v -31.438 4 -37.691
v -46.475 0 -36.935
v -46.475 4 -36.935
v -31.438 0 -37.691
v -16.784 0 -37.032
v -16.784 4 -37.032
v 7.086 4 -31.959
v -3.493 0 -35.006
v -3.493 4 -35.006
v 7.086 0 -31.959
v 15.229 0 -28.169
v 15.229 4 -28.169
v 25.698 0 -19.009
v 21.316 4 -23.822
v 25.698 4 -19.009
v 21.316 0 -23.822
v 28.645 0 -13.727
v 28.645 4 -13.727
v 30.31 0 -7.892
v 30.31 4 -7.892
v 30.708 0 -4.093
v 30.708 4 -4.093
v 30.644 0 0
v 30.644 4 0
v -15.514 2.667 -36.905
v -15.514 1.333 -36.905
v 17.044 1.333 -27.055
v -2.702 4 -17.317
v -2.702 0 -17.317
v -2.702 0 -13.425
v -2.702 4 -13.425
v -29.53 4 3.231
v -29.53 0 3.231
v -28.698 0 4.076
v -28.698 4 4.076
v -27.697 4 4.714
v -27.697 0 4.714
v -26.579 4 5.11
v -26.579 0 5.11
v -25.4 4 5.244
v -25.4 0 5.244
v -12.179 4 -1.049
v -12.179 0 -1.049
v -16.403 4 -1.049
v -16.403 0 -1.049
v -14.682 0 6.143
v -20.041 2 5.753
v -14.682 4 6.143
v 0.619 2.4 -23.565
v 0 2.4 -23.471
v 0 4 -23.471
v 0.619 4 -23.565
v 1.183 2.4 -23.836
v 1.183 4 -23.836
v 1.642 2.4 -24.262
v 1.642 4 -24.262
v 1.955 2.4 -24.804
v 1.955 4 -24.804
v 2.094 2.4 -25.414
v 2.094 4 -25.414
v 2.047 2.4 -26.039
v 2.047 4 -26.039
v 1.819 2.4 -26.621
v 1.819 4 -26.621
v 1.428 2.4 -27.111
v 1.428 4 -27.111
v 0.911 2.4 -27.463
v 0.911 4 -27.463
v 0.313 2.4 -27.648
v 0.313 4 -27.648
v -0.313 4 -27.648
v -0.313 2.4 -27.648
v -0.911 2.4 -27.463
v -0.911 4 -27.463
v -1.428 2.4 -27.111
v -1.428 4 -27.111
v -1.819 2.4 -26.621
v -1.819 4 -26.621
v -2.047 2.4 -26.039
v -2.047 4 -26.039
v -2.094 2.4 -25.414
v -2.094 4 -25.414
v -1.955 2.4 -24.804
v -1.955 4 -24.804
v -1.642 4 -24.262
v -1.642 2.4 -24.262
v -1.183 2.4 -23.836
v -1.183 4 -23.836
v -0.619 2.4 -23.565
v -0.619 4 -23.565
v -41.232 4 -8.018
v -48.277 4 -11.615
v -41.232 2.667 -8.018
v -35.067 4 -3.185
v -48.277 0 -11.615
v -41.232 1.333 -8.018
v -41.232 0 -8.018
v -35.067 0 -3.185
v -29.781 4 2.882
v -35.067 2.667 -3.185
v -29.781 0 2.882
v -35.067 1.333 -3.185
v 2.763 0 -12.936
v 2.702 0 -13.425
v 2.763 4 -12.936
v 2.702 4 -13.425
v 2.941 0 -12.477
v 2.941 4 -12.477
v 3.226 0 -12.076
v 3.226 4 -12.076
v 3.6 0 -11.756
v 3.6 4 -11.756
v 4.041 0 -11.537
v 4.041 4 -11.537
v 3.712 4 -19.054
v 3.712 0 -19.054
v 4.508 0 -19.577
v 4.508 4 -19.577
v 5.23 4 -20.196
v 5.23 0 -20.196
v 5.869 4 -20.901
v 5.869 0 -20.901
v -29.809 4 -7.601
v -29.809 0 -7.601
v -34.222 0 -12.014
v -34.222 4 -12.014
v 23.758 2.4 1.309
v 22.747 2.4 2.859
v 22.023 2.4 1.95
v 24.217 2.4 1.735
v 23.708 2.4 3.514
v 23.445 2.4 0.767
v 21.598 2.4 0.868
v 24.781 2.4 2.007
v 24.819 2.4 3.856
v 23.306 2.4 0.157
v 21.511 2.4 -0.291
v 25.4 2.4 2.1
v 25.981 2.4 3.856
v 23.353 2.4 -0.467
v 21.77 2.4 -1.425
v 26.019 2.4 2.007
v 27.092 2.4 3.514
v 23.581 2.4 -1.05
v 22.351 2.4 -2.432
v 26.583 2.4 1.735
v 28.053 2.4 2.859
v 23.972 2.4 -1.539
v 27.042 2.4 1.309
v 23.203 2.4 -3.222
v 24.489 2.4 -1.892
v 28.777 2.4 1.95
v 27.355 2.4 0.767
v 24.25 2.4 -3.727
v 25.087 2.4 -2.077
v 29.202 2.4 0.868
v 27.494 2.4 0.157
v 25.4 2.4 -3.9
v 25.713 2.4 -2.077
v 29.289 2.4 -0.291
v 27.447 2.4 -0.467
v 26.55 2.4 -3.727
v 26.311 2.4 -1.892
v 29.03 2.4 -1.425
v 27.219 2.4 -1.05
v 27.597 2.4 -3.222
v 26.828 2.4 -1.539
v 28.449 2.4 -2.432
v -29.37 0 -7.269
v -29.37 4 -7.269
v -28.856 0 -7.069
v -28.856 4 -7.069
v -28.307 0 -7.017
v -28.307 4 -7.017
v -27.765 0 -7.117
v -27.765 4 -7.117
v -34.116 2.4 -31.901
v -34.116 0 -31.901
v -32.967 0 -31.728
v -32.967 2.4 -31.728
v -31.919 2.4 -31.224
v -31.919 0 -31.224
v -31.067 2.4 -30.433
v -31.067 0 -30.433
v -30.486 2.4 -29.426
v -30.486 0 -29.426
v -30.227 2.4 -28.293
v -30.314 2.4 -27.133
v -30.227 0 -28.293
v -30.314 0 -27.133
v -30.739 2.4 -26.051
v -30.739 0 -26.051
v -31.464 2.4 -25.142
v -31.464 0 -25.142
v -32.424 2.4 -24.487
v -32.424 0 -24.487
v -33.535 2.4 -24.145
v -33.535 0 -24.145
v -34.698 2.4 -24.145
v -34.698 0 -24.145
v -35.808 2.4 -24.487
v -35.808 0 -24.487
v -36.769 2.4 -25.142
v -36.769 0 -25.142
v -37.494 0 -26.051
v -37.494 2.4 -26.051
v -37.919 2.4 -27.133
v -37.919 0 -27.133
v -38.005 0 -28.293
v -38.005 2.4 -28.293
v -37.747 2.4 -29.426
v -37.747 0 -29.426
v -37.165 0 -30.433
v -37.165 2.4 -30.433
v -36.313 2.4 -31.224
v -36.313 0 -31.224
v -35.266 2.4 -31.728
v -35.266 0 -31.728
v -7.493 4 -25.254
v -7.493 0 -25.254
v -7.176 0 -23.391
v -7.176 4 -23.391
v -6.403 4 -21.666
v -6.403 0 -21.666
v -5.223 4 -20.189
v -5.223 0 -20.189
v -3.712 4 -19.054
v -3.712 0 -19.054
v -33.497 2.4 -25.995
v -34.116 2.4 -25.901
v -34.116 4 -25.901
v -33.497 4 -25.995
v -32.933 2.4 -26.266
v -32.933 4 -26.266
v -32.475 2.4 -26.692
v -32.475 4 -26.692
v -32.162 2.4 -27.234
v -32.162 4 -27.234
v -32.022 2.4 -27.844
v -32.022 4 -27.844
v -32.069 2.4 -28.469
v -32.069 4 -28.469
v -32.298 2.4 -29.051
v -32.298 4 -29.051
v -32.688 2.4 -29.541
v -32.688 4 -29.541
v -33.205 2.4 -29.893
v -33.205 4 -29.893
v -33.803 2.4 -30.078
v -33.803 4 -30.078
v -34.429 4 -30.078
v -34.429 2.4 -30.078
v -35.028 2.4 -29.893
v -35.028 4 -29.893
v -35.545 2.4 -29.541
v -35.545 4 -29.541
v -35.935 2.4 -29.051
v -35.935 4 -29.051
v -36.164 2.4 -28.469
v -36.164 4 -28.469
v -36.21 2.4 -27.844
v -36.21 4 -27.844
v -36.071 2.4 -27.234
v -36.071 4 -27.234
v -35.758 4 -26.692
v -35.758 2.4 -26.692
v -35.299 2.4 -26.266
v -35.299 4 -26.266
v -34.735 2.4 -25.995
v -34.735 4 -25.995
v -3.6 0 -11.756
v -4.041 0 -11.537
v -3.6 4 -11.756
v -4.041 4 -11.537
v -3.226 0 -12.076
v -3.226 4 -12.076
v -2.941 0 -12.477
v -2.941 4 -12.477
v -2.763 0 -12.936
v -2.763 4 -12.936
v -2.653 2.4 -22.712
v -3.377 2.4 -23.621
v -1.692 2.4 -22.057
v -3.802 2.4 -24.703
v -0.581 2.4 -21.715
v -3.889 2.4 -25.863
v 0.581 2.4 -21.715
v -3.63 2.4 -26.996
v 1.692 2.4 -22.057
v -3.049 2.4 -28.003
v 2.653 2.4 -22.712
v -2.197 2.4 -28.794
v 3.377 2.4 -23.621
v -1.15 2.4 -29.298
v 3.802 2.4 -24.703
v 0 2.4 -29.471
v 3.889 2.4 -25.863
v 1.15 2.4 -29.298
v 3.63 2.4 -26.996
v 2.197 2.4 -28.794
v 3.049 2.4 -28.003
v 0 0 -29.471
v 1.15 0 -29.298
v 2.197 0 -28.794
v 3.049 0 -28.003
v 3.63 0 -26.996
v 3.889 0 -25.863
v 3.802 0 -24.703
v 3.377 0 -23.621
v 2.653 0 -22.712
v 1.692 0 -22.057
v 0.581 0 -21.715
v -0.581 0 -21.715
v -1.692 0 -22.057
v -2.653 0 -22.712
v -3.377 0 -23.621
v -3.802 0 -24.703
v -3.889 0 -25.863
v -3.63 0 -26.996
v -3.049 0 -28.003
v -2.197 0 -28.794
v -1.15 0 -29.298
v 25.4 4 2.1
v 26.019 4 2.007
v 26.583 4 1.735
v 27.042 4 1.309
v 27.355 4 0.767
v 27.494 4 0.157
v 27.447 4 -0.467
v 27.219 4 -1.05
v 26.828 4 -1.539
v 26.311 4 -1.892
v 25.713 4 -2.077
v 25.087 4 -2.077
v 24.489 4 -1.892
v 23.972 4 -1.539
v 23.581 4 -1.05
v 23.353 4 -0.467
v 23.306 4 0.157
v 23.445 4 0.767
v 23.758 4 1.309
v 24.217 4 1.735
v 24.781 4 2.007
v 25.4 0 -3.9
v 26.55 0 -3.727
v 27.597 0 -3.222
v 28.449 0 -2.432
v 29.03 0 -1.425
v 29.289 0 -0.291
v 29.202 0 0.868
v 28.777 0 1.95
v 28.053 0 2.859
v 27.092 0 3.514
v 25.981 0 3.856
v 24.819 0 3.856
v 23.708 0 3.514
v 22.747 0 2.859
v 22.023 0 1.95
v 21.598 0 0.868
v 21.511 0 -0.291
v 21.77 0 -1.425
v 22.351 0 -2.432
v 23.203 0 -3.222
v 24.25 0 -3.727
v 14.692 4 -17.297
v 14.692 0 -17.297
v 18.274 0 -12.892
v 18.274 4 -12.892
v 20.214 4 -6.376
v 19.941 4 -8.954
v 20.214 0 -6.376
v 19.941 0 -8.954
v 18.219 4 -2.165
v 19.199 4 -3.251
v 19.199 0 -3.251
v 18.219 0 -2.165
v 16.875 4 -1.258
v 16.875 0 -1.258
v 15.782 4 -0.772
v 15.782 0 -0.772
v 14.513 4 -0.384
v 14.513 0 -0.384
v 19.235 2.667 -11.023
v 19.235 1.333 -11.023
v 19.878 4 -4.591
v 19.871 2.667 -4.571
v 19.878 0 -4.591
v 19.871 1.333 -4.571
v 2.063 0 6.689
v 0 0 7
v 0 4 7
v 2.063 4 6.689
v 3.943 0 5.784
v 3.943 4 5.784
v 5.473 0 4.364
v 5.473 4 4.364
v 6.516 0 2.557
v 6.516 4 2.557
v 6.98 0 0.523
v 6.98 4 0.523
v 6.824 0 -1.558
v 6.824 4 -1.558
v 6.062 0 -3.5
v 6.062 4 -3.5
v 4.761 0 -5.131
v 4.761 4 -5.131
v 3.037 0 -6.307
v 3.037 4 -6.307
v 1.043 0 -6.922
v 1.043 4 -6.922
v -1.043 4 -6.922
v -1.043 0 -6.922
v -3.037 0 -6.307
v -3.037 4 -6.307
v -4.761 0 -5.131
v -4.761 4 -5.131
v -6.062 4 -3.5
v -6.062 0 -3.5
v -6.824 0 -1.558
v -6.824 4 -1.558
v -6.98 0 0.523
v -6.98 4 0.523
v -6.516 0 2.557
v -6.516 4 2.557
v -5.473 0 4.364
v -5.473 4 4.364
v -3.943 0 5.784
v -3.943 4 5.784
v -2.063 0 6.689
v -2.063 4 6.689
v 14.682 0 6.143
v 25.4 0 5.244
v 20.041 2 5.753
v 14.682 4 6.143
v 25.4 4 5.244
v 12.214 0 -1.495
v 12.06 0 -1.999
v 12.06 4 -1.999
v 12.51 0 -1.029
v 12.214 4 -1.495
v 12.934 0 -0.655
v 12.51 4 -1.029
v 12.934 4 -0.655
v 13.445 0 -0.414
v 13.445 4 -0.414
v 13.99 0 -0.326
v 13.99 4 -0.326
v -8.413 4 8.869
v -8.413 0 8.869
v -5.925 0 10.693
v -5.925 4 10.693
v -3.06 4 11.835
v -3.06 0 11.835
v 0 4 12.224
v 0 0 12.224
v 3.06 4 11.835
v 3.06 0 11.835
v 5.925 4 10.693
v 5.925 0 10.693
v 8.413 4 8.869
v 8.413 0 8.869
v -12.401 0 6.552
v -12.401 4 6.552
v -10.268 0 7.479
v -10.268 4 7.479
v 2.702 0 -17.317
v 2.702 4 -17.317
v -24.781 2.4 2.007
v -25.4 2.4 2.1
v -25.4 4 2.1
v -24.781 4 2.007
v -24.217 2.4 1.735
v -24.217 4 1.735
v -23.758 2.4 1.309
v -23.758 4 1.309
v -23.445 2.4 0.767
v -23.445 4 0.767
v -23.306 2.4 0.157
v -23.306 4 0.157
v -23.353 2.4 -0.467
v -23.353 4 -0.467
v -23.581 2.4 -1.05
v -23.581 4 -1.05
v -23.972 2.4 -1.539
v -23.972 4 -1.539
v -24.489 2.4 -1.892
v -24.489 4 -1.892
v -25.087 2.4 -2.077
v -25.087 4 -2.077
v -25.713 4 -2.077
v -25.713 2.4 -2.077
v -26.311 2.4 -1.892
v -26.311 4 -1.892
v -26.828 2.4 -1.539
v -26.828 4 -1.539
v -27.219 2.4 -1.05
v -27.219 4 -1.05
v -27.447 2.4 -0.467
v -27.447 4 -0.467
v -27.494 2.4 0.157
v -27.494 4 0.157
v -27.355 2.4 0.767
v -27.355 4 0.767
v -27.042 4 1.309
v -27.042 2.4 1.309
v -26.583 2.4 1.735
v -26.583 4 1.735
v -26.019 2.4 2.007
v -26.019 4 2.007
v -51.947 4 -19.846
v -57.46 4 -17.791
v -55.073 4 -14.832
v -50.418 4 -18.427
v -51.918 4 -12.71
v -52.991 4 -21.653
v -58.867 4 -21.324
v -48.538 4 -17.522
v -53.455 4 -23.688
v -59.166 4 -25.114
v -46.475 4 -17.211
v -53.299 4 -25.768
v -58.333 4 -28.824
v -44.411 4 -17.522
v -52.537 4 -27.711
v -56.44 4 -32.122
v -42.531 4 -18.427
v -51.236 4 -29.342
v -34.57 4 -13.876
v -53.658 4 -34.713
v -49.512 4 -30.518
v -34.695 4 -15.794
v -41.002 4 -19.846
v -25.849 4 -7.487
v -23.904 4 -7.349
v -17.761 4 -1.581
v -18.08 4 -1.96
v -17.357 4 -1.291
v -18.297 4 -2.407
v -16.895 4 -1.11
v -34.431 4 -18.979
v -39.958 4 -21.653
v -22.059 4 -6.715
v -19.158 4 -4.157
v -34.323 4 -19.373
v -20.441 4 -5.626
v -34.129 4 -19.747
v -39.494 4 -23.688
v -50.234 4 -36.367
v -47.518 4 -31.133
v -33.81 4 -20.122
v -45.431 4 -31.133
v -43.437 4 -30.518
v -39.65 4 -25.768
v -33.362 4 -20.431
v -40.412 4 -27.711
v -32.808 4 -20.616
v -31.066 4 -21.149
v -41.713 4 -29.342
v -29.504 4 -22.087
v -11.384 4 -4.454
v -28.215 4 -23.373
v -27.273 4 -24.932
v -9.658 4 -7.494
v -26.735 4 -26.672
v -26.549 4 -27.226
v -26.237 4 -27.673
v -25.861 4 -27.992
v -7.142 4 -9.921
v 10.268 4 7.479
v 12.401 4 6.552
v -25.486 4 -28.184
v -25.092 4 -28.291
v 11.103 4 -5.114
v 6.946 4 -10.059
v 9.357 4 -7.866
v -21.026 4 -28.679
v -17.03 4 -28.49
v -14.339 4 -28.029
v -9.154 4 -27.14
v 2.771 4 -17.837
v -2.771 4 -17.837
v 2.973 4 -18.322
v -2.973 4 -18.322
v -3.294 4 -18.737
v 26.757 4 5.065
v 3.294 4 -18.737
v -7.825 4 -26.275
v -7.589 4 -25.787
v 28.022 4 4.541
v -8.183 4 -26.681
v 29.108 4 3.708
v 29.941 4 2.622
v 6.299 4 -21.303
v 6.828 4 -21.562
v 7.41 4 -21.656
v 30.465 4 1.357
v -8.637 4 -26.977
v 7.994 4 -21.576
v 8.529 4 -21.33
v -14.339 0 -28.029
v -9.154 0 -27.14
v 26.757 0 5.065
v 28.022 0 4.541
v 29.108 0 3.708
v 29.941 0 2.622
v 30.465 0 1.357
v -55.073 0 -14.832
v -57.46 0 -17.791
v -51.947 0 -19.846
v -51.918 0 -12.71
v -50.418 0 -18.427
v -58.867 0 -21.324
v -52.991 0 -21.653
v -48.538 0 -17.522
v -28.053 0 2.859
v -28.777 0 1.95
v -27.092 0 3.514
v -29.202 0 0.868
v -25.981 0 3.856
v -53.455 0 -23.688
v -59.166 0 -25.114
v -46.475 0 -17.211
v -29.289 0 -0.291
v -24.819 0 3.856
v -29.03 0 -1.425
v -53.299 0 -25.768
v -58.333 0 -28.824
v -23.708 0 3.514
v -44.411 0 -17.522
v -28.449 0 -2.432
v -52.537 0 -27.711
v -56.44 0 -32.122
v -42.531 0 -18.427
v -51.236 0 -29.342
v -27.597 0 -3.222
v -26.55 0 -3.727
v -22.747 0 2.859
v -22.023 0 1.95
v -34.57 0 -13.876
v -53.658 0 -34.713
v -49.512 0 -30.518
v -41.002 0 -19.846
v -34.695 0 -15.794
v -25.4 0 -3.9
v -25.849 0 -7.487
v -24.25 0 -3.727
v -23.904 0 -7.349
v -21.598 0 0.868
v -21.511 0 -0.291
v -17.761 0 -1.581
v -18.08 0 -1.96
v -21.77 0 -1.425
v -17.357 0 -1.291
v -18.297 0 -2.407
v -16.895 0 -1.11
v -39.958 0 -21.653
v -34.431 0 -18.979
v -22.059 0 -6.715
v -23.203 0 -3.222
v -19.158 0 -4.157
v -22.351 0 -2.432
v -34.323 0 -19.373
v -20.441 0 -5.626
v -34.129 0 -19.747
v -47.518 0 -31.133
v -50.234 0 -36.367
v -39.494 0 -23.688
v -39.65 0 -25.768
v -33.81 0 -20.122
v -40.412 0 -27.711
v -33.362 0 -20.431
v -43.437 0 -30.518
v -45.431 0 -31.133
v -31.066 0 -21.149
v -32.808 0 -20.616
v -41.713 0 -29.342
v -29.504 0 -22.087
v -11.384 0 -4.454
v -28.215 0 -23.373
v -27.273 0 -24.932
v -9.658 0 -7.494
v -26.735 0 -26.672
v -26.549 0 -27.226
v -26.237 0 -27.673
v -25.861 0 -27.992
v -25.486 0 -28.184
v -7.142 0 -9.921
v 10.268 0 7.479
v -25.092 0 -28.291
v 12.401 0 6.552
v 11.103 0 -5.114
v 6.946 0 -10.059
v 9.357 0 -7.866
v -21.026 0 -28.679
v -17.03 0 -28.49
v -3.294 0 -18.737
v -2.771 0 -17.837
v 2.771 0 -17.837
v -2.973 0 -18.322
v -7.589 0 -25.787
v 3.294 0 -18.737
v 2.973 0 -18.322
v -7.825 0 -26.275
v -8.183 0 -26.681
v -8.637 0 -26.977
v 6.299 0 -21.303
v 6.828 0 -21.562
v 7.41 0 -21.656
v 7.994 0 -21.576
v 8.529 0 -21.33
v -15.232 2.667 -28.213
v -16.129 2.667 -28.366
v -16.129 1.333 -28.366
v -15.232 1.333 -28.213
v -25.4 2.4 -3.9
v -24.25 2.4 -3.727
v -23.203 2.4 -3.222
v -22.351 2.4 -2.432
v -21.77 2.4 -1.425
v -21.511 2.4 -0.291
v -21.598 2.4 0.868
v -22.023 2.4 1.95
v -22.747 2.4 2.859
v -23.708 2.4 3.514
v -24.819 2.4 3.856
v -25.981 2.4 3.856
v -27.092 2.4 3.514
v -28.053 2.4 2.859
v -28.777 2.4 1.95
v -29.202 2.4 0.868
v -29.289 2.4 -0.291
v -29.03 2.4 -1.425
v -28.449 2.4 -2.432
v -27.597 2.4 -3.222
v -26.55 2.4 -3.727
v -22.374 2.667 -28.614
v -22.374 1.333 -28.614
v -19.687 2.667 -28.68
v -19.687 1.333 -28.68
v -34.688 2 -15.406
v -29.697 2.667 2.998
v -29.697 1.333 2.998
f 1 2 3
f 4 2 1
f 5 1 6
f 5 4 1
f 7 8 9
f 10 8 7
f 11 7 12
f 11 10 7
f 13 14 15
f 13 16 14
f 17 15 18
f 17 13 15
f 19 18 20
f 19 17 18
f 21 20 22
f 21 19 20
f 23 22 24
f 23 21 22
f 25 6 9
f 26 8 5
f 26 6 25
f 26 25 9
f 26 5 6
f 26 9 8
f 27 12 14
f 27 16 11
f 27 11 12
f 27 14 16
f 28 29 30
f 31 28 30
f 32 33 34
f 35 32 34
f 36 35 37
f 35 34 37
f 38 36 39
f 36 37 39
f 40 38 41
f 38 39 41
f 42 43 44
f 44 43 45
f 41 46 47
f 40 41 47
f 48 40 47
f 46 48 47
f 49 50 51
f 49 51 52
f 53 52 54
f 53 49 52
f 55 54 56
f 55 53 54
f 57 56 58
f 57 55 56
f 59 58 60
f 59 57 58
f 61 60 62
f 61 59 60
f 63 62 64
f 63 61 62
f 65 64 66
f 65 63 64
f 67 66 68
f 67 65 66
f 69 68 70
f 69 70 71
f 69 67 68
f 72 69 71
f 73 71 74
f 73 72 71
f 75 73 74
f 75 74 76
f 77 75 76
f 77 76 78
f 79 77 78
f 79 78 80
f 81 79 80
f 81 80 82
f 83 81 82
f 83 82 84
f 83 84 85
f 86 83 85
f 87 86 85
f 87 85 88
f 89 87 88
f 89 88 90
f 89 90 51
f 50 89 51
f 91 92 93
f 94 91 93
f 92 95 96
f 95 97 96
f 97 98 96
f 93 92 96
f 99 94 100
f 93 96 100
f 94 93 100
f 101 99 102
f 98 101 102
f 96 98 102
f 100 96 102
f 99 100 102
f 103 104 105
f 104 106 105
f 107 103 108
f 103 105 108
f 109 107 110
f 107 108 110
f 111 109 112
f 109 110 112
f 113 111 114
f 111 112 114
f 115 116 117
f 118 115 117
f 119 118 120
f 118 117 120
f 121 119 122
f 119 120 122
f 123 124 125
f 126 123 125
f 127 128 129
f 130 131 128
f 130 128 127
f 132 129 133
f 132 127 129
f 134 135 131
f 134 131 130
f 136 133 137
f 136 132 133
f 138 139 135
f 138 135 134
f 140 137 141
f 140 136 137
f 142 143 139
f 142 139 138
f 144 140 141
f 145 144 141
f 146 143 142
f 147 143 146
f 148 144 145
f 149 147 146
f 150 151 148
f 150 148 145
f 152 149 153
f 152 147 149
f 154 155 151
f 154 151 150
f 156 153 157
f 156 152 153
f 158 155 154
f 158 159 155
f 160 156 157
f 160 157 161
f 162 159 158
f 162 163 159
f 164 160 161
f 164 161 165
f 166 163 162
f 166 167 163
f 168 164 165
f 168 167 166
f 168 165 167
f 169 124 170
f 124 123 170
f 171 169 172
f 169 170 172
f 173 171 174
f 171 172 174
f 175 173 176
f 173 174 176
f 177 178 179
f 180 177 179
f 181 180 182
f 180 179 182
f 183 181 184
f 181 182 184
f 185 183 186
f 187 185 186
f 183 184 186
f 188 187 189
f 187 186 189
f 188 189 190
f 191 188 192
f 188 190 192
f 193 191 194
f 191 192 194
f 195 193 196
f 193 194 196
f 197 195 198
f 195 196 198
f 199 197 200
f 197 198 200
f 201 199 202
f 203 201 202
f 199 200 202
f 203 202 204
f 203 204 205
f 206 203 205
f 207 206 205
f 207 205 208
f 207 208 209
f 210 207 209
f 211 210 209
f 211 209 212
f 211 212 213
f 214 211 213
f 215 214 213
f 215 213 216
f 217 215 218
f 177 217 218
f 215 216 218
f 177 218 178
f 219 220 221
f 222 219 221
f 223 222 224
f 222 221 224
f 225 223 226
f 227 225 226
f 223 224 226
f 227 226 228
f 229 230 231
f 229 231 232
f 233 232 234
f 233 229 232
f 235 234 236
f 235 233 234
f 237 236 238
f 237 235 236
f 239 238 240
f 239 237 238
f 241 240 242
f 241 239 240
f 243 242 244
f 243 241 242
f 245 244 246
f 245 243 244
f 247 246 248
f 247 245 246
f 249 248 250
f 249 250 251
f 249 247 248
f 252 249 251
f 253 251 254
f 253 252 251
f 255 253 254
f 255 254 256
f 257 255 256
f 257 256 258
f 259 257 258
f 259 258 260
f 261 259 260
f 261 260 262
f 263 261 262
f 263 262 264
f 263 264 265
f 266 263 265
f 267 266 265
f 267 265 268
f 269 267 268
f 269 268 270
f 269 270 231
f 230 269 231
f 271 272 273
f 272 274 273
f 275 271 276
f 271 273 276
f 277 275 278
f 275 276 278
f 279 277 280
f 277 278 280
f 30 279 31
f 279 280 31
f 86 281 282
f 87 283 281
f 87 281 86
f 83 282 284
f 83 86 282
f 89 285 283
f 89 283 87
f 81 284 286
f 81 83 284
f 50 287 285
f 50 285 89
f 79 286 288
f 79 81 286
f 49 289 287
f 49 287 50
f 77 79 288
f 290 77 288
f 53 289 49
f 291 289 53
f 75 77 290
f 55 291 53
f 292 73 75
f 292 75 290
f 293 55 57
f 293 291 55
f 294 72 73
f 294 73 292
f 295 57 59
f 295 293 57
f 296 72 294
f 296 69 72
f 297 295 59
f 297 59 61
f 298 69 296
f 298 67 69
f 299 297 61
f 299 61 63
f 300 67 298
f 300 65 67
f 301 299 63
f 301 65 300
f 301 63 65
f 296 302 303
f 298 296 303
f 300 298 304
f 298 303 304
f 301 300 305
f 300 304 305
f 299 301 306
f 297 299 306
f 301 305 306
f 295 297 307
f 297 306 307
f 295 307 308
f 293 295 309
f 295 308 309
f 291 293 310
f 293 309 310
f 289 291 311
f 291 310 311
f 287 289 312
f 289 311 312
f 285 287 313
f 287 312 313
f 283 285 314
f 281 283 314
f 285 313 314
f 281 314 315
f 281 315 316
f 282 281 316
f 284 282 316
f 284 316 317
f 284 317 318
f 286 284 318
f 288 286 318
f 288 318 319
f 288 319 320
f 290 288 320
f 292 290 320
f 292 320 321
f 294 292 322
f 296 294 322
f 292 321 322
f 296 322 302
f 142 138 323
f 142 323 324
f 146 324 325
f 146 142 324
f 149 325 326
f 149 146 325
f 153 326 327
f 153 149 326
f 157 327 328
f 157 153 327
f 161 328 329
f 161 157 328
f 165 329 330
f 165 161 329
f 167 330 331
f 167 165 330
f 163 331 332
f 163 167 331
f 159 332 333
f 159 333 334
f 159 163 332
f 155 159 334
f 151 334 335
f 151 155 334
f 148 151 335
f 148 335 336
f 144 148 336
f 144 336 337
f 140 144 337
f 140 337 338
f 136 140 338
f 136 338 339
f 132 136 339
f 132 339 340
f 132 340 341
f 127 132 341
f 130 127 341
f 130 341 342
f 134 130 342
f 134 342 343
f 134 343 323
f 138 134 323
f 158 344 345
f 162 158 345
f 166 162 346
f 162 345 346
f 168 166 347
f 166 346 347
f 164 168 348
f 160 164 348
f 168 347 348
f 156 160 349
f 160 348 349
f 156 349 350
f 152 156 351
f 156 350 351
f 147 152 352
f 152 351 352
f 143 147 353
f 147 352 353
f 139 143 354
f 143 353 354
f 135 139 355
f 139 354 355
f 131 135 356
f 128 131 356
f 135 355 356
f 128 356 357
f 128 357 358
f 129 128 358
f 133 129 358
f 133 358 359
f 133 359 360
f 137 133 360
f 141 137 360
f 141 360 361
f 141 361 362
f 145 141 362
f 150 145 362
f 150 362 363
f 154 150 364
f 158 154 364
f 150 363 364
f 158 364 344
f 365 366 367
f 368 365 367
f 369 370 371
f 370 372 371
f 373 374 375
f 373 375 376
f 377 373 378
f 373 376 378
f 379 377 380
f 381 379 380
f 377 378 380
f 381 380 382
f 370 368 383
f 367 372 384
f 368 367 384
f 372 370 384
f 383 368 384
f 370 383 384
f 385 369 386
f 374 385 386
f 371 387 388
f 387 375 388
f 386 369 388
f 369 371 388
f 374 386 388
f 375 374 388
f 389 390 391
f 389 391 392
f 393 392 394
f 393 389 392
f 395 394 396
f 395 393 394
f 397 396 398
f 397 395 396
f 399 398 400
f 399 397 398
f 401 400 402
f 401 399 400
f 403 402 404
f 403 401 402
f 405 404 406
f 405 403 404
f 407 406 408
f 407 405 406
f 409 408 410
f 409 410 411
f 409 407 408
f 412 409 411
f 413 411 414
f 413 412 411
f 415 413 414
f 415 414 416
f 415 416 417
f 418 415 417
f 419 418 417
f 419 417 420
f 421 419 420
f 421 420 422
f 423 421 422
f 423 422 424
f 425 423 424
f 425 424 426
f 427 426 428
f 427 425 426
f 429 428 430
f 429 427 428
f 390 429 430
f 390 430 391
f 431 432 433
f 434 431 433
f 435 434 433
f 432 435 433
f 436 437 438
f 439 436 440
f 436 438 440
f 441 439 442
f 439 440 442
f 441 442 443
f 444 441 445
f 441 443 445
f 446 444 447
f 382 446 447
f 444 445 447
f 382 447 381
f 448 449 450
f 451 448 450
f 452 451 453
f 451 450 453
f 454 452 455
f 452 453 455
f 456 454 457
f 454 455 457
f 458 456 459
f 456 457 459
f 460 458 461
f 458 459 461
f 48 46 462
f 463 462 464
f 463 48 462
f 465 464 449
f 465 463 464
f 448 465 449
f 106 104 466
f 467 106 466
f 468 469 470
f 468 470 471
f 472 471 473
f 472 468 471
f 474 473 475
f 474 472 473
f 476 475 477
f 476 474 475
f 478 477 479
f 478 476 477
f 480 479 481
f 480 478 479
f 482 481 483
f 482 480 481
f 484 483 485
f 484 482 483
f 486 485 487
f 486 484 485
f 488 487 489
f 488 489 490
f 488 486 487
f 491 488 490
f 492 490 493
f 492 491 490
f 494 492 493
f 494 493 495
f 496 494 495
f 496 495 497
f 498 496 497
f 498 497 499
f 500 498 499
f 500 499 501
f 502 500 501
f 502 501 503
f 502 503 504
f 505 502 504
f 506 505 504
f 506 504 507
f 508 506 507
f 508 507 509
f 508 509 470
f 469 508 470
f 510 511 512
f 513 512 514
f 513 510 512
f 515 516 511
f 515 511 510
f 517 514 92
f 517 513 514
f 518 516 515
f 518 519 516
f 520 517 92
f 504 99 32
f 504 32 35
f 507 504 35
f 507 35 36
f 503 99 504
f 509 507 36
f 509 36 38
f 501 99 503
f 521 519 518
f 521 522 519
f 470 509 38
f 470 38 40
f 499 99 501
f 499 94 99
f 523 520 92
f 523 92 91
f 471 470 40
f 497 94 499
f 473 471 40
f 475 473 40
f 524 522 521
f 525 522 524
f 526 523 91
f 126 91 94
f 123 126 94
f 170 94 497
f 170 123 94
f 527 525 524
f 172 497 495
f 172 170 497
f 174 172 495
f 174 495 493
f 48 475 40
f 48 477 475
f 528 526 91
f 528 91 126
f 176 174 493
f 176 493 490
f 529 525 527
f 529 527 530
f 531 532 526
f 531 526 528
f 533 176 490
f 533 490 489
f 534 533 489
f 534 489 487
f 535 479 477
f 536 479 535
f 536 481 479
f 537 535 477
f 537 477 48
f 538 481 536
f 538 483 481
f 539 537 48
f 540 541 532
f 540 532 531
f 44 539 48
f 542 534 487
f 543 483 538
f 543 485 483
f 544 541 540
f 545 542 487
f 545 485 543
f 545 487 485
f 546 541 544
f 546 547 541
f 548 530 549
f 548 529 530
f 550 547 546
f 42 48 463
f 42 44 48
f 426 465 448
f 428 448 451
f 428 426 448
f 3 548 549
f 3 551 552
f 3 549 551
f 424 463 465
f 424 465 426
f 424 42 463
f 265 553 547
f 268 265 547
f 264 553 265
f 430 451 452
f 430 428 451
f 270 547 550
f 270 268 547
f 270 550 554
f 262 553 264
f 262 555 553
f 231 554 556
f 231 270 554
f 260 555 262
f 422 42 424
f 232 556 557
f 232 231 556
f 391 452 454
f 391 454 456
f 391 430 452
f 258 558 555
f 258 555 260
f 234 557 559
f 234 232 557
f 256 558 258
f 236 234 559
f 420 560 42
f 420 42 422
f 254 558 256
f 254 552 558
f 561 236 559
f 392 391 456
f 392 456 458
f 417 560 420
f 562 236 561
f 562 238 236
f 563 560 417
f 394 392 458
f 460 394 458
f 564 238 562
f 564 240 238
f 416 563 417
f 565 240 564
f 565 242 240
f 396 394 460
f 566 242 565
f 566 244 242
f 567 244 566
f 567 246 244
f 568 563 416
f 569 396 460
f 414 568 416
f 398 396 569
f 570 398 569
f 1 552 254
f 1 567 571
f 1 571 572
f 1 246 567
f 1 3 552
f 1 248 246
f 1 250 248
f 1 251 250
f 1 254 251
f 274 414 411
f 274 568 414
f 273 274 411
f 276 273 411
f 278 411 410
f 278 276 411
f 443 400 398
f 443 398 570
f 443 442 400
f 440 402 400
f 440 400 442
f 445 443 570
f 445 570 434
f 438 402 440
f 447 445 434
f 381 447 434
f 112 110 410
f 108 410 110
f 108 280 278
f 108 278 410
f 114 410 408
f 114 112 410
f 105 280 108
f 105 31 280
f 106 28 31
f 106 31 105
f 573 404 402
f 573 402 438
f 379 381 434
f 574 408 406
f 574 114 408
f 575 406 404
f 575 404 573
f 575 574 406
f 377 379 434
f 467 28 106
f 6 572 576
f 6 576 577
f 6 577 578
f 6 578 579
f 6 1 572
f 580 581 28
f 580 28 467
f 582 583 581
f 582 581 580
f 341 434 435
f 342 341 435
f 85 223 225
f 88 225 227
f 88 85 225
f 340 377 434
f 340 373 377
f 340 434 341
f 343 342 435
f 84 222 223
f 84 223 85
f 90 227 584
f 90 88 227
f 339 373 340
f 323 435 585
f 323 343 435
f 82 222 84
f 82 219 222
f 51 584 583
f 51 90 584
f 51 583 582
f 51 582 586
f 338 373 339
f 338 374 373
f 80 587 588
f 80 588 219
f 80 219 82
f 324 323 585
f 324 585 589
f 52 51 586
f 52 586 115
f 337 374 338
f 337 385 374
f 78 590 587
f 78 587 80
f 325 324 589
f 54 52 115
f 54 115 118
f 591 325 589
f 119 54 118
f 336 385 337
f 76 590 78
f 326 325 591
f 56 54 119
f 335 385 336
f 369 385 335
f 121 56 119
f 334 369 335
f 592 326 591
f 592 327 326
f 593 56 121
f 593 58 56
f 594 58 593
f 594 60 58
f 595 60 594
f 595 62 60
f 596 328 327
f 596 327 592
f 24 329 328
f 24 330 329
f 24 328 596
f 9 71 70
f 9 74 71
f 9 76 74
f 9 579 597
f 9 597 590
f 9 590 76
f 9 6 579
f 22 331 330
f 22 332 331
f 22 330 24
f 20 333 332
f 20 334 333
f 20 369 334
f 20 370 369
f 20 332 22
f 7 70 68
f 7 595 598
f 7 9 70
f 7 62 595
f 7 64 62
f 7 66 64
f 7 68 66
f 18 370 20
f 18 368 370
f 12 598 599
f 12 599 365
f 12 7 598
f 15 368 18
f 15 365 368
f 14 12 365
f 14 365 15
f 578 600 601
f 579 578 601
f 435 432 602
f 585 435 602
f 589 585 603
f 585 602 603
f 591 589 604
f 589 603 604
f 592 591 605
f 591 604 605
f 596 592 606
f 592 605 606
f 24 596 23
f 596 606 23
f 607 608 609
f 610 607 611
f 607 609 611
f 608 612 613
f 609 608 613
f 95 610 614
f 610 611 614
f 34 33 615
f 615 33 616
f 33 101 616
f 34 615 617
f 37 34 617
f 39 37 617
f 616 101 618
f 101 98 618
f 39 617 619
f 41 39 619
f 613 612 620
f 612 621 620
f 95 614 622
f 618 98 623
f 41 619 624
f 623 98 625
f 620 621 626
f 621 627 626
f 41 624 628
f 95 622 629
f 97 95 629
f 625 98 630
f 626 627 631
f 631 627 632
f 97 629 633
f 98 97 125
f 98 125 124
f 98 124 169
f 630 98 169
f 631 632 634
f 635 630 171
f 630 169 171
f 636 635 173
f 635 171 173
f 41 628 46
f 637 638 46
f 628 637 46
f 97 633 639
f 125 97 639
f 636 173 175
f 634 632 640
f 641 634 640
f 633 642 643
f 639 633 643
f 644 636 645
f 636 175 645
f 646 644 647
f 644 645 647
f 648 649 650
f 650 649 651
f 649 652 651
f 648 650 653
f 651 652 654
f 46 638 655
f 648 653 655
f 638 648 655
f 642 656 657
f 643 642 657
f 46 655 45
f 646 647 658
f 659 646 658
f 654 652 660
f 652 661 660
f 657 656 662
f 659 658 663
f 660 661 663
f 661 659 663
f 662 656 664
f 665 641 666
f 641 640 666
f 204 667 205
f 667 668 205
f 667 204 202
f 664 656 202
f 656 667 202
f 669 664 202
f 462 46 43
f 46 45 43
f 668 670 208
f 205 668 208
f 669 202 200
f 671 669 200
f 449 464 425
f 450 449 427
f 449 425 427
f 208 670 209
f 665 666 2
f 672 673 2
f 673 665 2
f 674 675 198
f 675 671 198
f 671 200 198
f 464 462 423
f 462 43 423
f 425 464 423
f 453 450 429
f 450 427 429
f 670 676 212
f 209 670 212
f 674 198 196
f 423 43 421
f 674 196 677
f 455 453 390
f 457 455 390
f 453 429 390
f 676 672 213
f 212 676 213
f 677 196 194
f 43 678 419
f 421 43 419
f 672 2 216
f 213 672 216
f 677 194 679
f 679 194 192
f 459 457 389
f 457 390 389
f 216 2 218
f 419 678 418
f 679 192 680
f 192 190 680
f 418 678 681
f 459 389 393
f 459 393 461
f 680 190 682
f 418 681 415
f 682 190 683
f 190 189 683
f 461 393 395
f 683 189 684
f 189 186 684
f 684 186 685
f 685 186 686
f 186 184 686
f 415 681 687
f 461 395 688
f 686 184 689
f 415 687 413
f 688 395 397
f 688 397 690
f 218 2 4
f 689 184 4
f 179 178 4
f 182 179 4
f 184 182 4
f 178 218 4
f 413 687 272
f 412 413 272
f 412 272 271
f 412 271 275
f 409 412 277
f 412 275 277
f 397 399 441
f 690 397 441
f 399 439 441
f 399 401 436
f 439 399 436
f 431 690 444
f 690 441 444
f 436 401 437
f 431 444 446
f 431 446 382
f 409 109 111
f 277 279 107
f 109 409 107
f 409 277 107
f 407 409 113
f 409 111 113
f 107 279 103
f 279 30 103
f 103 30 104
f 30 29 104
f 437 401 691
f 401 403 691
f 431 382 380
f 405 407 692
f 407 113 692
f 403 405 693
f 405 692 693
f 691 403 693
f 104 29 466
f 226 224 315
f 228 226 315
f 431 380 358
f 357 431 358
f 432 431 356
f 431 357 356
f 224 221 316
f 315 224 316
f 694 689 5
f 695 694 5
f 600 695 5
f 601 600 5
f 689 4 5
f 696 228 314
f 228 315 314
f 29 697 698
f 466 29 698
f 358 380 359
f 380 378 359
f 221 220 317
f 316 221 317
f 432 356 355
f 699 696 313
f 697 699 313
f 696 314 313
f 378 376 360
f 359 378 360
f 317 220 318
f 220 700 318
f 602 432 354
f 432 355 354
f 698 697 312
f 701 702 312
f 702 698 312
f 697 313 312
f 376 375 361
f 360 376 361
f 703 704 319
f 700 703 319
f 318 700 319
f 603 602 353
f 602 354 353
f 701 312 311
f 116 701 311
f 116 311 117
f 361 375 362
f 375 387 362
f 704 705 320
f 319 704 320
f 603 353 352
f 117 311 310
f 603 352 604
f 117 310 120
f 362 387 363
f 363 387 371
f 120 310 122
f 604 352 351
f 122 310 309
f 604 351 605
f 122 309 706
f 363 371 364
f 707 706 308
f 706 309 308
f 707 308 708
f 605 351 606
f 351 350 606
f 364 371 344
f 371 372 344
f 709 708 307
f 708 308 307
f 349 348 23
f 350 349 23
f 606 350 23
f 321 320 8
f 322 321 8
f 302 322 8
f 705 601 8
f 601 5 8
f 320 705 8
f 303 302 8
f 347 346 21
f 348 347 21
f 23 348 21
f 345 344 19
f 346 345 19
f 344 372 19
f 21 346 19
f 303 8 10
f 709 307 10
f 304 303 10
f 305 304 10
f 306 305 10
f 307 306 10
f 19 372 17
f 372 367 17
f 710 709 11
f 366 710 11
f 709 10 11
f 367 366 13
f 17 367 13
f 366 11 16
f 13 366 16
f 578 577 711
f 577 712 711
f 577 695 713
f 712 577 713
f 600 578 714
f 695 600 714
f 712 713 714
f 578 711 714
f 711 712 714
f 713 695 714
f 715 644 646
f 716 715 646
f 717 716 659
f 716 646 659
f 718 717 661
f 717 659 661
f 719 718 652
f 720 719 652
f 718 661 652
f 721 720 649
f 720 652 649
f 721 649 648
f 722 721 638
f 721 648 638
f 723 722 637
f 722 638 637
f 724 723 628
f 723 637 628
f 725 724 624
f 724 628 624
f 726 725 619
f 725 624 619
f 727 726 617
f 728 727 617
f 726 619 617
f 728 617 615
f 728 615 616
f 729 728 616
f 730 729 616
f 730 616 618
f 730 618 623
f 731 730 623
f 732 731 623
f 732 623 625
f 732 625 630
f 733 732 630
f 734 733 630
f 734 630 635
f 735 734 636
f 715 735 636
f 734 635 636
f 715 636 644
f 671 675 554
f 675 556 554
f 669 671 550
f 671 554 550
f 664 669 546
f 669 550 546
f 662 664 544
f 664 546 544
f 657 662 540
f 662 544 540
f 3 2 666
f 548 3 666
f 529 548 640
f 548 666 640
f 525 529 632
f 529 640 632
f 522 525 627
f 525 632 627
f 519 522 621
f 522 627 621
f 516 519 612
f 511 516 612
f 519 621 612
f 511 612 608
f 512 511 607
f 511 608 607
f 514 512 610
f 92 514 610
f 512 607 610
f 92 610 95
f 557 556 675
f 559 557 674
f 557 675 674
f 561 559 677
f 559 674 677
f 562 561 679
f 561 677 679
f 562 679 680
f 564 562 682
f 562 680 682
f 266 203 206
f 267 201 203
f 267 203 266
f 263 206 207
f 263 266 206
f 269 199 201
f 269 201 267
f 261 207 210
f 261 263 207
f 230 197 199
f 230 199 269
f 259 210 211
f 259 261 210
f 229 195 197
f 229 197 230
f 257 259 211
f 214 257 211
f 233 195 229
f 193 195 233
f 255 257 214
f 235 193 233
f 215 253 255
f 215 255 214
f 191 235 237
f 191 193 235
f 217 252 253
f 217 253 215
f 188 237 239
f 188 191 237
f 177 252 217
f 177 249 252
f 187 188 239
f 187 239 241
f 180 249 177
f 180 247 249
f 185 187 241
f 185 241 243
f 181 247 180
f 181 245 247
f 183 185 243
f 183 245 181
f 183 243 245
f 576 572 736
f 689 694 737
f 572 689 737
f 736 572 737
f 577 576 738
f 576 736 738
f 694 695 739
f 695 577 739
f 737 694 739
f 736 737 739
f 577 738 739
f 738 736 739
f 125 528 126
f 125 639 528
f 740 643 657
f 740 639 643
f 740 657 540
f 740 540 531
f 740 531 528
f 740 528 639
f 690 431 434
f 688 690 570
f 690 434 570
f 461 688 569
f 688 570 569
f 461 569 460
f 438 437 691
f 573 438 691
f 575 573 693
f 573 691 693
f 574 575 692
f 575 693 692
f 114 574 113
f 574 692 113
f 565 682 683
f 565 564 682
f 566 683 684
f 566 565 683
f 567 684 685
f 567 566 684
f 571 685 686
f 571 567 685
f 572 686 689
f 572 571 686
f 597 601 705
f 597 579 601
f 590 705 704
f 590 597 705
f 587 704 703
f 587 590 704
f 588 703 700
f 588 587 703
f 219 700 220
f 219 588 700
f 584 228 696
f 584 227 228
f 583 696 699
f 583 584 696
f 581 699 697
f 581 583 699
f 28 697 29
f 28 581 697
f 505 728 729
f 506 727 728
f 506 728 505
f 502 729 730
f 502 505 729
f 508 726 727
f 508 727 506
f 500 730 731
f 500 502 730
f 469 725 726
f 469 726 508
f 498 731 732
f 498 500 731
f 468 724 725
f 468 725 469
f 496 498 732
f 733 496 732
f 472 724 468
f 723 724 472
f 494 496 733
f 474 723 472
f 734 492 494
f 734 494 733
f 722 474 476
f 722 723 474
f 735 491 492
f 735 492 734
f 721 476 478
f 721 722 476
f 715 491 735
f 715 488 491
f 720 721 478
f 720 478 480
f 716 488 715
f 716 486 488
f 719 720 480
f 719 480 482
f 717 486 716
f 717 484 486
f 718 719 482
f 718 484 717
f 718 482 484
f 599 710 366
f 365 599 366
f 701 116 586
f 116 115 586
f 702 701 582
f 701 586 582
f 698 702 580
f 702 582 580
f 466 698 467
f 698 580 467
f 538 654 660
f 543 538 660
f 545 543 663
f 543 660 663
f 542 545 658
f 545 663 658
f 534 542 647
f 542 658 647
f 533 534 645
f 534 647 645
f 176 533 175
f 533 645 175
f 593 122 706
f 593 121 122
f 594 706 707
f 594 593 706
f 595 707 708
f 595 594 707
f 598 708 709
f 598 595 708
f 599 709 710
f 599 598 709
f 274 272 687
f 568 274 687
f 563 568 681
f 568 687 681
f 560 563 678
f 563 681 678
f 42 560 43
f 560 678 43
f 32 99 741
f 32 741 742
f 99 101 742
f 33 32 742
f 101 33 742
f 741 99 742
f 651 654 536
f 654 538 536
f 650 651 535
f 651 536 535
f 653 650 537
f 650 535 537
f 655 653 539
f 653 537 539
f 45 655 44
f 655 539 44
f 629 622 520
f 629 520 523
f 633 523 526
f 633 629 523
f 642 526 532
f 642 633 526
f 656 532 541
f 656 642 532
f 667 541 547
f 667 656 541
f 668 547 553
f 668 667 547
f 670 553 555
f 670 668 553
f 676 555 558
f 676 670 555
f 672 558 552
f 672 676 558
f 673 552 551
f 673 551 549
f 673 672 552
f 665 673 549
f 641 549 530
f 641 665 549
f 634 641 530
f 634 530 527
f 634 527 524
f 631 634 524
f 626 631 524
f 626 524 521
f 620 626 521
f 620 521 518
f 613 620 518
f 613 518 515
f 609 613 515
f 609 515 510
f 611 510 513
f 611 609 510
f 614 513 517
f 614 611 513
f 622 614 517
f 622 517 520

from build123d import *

# Parameters (mm, degrees)
SKETCH1_R           = 2.1
SKETCH1_R_2         = 7
BOSS_EXTRUDE1_DEPTH = 4
FILLET1_R           = 10
SKETCH2_R           = 3.9
CUT_EXTRUDE1_DEPTH  = 2.4
FILLET2_R           = 2


with BuildPart() as part:
    # Sketch1 → Boss-Extrude1 (new body)
    with BuildSketch(Plane(origin=(0, 0, 0), x_dir=(1, 0, 0), z_dir=(0, 1, 0))):
        with BuildLine():
            add(Edge.make_bspline(
                [(-48.276532762, 11.615114404), (-40.793059369, 8.635332343), (-34.627763453, 3.802891886), (-29.780645012, -2.882206965)],
                knots=[0.158174001, 0.158174001, 0.158174001, 0.158174001, 0.985694322, 0.985694322, 0.985694322, 0.985694322], degree=3))
            add(Edge.make_bspline(
                [(-29.780645012, -2.882206965), (-29.696850917, -2.997774969), (-29.613450765, -3.113896649), (-29.530444557, -3.230572003)],
                knots=[0.985694322, 0.985694322, 0.985694322, 0.985694322, 1, 1, 1, 1], degree=3))
            ThreePointArc((-29.530444557, -3.230572003), (-27.697474443, -4.713679973), (-25.4, -5.243774185))
            add(Edge.make_bspline(
                [(-25.4, -5.243774185), (-17.91803421, -6.039173757), (-10.43606842, -6.365978653)],
                knots=[0, 0, 0, 0.294565582, 0.294565582, 0.294565582], degree=2))
            ThreePointArc((-10.43606842, -6.365978653), (0, -12.224451247), (10.43606842, -6.365978653))
            add(Edge.make_bspline(
                [(10.43606842, -6.365978653), (17.918034209, -6.039173757), (25.4, -5.243774185)],
                knots=[0.705434418, 0.705434418, 0.705434418, 1, 1, 1], degree=2))
            ThreePointArc((25.4, -5.243774185), (29.107908285, -3.707908285), (30.643774185, 0))
            add(Edge.make_bspline(
                [(-46.474516908, 36.934762739), (-23.164206568, 39.351897946), (33.373901801, 38.120150773), (30.643774185, 0)],
                knots=[0, 0, 0, 0, 1, 1, 1, 1], degree=3))
            ThreePointArc((-46.474516908, 36.934762739), (-59.166363236, 25.114100216), (-48.276532762, 11.615114404))
        make_face()
        with Locations(Location((-25.4, 0, 0), (0, 0, 270))):
            Circle(SKETCH1_R, mode=Mode.SUBTRACT)
        with Locations(Location((0, 0, 0), (0, 0, 270))):
            Circle(SKETCH1_R_2, mode=Mode.SUBTRACT)
        with Locations(Location((25.4, 0, 0), (0, 0, 270))):
            Circle(SKETCH1_R, mode=Mode.SUBTRACT)
        with BuildLine():
            Line((6.818861244, 22.448276617), (14.692223791, 17.296643593))
            add(Edge.make_bspline(
                [(14.692223791, 17.296643593), (20.936611379, 11.517843997), (24.015411048, 1.179452343), (12.224451247, 0)],
                knots=[0.294731971, 0.294731971, 0.294731971, 0.294731971, 1, 1, 1, 1], degree=3))
            ThreePointArc((12.224451247, 0), (9.551728824, 7.629002869), (2.702275798, 11.922034801))
            Line((2.702275798, 11.922034801), (2.702275798, 18.575013303))
            ThreePointArc((2.702275798, 18.575013303), (5.139411914, 20.10900226), (6.818861244, 22.448276617))
        make_face(mode=Mode.SUBTRACT)
        with Locations(Location((-46.474516908, 24.210813251, 0), (0, 0, 270))):
            Circle(SKETCH1_R_2, mode=Mode.SUBTRACT)
        with BuildLine():
            add(Edge.make_bspline(
                [(-26.616347467, 28.001234406), (-23.355822424, 28.704578443), (-20.160458878, 28.867528343), (-17.03025683, 28.490084106)],
                knots=[0, 0, 0, 0, 0.490853217, 0.490853217, 0.490853217, 0.490853217], degree=3))
            add(Edge.make_bspline(
                [(-17.03025683, 28.490084106), (-16.127682529, 28.381250406), (-15.230525893, 28.227487183), (-14.338786924, 28.028794436)],
                knots=[0.490853217, 0.490853217, 0.490853217, 0.490853217, 0.632387691, 0.632387691, 0.632387691, 0.632387691], degree=3))
            Line((-14.338786924, 28.028794436), (-7.392215006, 26.83822498))
            ThreePointArc((-7.392215006, 26.83822498), (-6.522641563, 21.869230657), (-2.702275798, 18.575013303))
            Line((-2.702275798, 18.575013303), (-2.702275798, 11.922034801))
            ThreePointArc((-2.702275798, 11.922034801), (-9.215350555, 8.032093278), (-12.179376812, 1.048803495))
            Line((-12.179376812, 1.048803495), (-17.973694645, 1.048803495))
            ThreePointArc((-17.973694645, 1.048803495), (-21.967394814, 6.668374737), (-28.861522607, 6.653409745))
            Line((-28.861522607, 6.653409745), (-34.221790482, 12.01367762))
            add(Edge.make_bspline(
                [(-34.116347467, 20.501234406), (-35.2187538, 15.994576363), (-34.221790482, 12.01367762)],
                knots=[0, 0, 0, 0.526441047, 0.526441047, 0.526441047], degree=2))
            ThreePointArc((-34.116347467, 20.501234406), (-28.813046608, 22.697933547), (-26.616347467, 28.001234406))
        make_face(mode=Mode.SUBTRACT)
        with Locations(Location((-34.116347467, 28.001234406, 0), (0, 0, 270))):
            Circle(SKETCH1_R, mode=Mode.SUBTRACT)
        with Locations(Location((0, 25.57127698, 0), (0, 0, 270))):
            Circle(SKETCH1_R, mode=Mode.SUBTRACT)
    extrude(amount=BOSS_EXTRUDE1_DEPTH)

    # Fillet1
    fillet1_edges = [part.edges().sort_by_distance(p)[0] for p in [
        (10.43606842, 2, 6.365978653),
        (-10.43606842, 2, 6.365978653),
    ]]
    fillet(fillet1_edges, radius=FILLET1_R)

    # Sketch2 → Cut-Extrude1 (cut)
    with BuildSketch(Plane.XZ):
        with Locations(Location((0, -25.57127698, 0), (0, 0, 270))):
            Circle(SKETCH2_R)
        with Locations(Location((25.4, 0, 0), (0, 0, 270))):
            Circle(SKETCH2_R)
        with Locations(Location((-25.4, 0, 0), (0, 0, 270))):
            Circle(SKETCH2_R)
        with Locations(Location((-34.116347467, -28.001234406, 0), (0, 0, 270))):
            Circle(SKETCH2_R)
    extrude(amount=-CUT_EXTRUDE1_DEPTH, mode=Mode.SUBTRACT)

    # Fillet2
    fillet2_edges = [part.edges().sort_by_distance(p)[0] for p in [
        (-7.392215006, 2, -26.83822498),
        (-26.616347467, 2, -28.001234406),
        (-28.861522607, 2, -6.653409745),
        (-17.973694645, 2, -1.048803495),
        (12.224451247, 2, 0),
        (-34.116347467, 2, -20.501234406),
        (2.702275798, 2, -11.922034801),
        (2.702275798, 2, -18.575013303),
        (6.818861244, 2, -22.448276617),
        (-2.702275798, 2, -11.922034801),
        (-2.702275798, 2, -18.575013303),
    ]]
    fillet(fillet2_edges, radius=FILLET2_R)


solid = part.part
